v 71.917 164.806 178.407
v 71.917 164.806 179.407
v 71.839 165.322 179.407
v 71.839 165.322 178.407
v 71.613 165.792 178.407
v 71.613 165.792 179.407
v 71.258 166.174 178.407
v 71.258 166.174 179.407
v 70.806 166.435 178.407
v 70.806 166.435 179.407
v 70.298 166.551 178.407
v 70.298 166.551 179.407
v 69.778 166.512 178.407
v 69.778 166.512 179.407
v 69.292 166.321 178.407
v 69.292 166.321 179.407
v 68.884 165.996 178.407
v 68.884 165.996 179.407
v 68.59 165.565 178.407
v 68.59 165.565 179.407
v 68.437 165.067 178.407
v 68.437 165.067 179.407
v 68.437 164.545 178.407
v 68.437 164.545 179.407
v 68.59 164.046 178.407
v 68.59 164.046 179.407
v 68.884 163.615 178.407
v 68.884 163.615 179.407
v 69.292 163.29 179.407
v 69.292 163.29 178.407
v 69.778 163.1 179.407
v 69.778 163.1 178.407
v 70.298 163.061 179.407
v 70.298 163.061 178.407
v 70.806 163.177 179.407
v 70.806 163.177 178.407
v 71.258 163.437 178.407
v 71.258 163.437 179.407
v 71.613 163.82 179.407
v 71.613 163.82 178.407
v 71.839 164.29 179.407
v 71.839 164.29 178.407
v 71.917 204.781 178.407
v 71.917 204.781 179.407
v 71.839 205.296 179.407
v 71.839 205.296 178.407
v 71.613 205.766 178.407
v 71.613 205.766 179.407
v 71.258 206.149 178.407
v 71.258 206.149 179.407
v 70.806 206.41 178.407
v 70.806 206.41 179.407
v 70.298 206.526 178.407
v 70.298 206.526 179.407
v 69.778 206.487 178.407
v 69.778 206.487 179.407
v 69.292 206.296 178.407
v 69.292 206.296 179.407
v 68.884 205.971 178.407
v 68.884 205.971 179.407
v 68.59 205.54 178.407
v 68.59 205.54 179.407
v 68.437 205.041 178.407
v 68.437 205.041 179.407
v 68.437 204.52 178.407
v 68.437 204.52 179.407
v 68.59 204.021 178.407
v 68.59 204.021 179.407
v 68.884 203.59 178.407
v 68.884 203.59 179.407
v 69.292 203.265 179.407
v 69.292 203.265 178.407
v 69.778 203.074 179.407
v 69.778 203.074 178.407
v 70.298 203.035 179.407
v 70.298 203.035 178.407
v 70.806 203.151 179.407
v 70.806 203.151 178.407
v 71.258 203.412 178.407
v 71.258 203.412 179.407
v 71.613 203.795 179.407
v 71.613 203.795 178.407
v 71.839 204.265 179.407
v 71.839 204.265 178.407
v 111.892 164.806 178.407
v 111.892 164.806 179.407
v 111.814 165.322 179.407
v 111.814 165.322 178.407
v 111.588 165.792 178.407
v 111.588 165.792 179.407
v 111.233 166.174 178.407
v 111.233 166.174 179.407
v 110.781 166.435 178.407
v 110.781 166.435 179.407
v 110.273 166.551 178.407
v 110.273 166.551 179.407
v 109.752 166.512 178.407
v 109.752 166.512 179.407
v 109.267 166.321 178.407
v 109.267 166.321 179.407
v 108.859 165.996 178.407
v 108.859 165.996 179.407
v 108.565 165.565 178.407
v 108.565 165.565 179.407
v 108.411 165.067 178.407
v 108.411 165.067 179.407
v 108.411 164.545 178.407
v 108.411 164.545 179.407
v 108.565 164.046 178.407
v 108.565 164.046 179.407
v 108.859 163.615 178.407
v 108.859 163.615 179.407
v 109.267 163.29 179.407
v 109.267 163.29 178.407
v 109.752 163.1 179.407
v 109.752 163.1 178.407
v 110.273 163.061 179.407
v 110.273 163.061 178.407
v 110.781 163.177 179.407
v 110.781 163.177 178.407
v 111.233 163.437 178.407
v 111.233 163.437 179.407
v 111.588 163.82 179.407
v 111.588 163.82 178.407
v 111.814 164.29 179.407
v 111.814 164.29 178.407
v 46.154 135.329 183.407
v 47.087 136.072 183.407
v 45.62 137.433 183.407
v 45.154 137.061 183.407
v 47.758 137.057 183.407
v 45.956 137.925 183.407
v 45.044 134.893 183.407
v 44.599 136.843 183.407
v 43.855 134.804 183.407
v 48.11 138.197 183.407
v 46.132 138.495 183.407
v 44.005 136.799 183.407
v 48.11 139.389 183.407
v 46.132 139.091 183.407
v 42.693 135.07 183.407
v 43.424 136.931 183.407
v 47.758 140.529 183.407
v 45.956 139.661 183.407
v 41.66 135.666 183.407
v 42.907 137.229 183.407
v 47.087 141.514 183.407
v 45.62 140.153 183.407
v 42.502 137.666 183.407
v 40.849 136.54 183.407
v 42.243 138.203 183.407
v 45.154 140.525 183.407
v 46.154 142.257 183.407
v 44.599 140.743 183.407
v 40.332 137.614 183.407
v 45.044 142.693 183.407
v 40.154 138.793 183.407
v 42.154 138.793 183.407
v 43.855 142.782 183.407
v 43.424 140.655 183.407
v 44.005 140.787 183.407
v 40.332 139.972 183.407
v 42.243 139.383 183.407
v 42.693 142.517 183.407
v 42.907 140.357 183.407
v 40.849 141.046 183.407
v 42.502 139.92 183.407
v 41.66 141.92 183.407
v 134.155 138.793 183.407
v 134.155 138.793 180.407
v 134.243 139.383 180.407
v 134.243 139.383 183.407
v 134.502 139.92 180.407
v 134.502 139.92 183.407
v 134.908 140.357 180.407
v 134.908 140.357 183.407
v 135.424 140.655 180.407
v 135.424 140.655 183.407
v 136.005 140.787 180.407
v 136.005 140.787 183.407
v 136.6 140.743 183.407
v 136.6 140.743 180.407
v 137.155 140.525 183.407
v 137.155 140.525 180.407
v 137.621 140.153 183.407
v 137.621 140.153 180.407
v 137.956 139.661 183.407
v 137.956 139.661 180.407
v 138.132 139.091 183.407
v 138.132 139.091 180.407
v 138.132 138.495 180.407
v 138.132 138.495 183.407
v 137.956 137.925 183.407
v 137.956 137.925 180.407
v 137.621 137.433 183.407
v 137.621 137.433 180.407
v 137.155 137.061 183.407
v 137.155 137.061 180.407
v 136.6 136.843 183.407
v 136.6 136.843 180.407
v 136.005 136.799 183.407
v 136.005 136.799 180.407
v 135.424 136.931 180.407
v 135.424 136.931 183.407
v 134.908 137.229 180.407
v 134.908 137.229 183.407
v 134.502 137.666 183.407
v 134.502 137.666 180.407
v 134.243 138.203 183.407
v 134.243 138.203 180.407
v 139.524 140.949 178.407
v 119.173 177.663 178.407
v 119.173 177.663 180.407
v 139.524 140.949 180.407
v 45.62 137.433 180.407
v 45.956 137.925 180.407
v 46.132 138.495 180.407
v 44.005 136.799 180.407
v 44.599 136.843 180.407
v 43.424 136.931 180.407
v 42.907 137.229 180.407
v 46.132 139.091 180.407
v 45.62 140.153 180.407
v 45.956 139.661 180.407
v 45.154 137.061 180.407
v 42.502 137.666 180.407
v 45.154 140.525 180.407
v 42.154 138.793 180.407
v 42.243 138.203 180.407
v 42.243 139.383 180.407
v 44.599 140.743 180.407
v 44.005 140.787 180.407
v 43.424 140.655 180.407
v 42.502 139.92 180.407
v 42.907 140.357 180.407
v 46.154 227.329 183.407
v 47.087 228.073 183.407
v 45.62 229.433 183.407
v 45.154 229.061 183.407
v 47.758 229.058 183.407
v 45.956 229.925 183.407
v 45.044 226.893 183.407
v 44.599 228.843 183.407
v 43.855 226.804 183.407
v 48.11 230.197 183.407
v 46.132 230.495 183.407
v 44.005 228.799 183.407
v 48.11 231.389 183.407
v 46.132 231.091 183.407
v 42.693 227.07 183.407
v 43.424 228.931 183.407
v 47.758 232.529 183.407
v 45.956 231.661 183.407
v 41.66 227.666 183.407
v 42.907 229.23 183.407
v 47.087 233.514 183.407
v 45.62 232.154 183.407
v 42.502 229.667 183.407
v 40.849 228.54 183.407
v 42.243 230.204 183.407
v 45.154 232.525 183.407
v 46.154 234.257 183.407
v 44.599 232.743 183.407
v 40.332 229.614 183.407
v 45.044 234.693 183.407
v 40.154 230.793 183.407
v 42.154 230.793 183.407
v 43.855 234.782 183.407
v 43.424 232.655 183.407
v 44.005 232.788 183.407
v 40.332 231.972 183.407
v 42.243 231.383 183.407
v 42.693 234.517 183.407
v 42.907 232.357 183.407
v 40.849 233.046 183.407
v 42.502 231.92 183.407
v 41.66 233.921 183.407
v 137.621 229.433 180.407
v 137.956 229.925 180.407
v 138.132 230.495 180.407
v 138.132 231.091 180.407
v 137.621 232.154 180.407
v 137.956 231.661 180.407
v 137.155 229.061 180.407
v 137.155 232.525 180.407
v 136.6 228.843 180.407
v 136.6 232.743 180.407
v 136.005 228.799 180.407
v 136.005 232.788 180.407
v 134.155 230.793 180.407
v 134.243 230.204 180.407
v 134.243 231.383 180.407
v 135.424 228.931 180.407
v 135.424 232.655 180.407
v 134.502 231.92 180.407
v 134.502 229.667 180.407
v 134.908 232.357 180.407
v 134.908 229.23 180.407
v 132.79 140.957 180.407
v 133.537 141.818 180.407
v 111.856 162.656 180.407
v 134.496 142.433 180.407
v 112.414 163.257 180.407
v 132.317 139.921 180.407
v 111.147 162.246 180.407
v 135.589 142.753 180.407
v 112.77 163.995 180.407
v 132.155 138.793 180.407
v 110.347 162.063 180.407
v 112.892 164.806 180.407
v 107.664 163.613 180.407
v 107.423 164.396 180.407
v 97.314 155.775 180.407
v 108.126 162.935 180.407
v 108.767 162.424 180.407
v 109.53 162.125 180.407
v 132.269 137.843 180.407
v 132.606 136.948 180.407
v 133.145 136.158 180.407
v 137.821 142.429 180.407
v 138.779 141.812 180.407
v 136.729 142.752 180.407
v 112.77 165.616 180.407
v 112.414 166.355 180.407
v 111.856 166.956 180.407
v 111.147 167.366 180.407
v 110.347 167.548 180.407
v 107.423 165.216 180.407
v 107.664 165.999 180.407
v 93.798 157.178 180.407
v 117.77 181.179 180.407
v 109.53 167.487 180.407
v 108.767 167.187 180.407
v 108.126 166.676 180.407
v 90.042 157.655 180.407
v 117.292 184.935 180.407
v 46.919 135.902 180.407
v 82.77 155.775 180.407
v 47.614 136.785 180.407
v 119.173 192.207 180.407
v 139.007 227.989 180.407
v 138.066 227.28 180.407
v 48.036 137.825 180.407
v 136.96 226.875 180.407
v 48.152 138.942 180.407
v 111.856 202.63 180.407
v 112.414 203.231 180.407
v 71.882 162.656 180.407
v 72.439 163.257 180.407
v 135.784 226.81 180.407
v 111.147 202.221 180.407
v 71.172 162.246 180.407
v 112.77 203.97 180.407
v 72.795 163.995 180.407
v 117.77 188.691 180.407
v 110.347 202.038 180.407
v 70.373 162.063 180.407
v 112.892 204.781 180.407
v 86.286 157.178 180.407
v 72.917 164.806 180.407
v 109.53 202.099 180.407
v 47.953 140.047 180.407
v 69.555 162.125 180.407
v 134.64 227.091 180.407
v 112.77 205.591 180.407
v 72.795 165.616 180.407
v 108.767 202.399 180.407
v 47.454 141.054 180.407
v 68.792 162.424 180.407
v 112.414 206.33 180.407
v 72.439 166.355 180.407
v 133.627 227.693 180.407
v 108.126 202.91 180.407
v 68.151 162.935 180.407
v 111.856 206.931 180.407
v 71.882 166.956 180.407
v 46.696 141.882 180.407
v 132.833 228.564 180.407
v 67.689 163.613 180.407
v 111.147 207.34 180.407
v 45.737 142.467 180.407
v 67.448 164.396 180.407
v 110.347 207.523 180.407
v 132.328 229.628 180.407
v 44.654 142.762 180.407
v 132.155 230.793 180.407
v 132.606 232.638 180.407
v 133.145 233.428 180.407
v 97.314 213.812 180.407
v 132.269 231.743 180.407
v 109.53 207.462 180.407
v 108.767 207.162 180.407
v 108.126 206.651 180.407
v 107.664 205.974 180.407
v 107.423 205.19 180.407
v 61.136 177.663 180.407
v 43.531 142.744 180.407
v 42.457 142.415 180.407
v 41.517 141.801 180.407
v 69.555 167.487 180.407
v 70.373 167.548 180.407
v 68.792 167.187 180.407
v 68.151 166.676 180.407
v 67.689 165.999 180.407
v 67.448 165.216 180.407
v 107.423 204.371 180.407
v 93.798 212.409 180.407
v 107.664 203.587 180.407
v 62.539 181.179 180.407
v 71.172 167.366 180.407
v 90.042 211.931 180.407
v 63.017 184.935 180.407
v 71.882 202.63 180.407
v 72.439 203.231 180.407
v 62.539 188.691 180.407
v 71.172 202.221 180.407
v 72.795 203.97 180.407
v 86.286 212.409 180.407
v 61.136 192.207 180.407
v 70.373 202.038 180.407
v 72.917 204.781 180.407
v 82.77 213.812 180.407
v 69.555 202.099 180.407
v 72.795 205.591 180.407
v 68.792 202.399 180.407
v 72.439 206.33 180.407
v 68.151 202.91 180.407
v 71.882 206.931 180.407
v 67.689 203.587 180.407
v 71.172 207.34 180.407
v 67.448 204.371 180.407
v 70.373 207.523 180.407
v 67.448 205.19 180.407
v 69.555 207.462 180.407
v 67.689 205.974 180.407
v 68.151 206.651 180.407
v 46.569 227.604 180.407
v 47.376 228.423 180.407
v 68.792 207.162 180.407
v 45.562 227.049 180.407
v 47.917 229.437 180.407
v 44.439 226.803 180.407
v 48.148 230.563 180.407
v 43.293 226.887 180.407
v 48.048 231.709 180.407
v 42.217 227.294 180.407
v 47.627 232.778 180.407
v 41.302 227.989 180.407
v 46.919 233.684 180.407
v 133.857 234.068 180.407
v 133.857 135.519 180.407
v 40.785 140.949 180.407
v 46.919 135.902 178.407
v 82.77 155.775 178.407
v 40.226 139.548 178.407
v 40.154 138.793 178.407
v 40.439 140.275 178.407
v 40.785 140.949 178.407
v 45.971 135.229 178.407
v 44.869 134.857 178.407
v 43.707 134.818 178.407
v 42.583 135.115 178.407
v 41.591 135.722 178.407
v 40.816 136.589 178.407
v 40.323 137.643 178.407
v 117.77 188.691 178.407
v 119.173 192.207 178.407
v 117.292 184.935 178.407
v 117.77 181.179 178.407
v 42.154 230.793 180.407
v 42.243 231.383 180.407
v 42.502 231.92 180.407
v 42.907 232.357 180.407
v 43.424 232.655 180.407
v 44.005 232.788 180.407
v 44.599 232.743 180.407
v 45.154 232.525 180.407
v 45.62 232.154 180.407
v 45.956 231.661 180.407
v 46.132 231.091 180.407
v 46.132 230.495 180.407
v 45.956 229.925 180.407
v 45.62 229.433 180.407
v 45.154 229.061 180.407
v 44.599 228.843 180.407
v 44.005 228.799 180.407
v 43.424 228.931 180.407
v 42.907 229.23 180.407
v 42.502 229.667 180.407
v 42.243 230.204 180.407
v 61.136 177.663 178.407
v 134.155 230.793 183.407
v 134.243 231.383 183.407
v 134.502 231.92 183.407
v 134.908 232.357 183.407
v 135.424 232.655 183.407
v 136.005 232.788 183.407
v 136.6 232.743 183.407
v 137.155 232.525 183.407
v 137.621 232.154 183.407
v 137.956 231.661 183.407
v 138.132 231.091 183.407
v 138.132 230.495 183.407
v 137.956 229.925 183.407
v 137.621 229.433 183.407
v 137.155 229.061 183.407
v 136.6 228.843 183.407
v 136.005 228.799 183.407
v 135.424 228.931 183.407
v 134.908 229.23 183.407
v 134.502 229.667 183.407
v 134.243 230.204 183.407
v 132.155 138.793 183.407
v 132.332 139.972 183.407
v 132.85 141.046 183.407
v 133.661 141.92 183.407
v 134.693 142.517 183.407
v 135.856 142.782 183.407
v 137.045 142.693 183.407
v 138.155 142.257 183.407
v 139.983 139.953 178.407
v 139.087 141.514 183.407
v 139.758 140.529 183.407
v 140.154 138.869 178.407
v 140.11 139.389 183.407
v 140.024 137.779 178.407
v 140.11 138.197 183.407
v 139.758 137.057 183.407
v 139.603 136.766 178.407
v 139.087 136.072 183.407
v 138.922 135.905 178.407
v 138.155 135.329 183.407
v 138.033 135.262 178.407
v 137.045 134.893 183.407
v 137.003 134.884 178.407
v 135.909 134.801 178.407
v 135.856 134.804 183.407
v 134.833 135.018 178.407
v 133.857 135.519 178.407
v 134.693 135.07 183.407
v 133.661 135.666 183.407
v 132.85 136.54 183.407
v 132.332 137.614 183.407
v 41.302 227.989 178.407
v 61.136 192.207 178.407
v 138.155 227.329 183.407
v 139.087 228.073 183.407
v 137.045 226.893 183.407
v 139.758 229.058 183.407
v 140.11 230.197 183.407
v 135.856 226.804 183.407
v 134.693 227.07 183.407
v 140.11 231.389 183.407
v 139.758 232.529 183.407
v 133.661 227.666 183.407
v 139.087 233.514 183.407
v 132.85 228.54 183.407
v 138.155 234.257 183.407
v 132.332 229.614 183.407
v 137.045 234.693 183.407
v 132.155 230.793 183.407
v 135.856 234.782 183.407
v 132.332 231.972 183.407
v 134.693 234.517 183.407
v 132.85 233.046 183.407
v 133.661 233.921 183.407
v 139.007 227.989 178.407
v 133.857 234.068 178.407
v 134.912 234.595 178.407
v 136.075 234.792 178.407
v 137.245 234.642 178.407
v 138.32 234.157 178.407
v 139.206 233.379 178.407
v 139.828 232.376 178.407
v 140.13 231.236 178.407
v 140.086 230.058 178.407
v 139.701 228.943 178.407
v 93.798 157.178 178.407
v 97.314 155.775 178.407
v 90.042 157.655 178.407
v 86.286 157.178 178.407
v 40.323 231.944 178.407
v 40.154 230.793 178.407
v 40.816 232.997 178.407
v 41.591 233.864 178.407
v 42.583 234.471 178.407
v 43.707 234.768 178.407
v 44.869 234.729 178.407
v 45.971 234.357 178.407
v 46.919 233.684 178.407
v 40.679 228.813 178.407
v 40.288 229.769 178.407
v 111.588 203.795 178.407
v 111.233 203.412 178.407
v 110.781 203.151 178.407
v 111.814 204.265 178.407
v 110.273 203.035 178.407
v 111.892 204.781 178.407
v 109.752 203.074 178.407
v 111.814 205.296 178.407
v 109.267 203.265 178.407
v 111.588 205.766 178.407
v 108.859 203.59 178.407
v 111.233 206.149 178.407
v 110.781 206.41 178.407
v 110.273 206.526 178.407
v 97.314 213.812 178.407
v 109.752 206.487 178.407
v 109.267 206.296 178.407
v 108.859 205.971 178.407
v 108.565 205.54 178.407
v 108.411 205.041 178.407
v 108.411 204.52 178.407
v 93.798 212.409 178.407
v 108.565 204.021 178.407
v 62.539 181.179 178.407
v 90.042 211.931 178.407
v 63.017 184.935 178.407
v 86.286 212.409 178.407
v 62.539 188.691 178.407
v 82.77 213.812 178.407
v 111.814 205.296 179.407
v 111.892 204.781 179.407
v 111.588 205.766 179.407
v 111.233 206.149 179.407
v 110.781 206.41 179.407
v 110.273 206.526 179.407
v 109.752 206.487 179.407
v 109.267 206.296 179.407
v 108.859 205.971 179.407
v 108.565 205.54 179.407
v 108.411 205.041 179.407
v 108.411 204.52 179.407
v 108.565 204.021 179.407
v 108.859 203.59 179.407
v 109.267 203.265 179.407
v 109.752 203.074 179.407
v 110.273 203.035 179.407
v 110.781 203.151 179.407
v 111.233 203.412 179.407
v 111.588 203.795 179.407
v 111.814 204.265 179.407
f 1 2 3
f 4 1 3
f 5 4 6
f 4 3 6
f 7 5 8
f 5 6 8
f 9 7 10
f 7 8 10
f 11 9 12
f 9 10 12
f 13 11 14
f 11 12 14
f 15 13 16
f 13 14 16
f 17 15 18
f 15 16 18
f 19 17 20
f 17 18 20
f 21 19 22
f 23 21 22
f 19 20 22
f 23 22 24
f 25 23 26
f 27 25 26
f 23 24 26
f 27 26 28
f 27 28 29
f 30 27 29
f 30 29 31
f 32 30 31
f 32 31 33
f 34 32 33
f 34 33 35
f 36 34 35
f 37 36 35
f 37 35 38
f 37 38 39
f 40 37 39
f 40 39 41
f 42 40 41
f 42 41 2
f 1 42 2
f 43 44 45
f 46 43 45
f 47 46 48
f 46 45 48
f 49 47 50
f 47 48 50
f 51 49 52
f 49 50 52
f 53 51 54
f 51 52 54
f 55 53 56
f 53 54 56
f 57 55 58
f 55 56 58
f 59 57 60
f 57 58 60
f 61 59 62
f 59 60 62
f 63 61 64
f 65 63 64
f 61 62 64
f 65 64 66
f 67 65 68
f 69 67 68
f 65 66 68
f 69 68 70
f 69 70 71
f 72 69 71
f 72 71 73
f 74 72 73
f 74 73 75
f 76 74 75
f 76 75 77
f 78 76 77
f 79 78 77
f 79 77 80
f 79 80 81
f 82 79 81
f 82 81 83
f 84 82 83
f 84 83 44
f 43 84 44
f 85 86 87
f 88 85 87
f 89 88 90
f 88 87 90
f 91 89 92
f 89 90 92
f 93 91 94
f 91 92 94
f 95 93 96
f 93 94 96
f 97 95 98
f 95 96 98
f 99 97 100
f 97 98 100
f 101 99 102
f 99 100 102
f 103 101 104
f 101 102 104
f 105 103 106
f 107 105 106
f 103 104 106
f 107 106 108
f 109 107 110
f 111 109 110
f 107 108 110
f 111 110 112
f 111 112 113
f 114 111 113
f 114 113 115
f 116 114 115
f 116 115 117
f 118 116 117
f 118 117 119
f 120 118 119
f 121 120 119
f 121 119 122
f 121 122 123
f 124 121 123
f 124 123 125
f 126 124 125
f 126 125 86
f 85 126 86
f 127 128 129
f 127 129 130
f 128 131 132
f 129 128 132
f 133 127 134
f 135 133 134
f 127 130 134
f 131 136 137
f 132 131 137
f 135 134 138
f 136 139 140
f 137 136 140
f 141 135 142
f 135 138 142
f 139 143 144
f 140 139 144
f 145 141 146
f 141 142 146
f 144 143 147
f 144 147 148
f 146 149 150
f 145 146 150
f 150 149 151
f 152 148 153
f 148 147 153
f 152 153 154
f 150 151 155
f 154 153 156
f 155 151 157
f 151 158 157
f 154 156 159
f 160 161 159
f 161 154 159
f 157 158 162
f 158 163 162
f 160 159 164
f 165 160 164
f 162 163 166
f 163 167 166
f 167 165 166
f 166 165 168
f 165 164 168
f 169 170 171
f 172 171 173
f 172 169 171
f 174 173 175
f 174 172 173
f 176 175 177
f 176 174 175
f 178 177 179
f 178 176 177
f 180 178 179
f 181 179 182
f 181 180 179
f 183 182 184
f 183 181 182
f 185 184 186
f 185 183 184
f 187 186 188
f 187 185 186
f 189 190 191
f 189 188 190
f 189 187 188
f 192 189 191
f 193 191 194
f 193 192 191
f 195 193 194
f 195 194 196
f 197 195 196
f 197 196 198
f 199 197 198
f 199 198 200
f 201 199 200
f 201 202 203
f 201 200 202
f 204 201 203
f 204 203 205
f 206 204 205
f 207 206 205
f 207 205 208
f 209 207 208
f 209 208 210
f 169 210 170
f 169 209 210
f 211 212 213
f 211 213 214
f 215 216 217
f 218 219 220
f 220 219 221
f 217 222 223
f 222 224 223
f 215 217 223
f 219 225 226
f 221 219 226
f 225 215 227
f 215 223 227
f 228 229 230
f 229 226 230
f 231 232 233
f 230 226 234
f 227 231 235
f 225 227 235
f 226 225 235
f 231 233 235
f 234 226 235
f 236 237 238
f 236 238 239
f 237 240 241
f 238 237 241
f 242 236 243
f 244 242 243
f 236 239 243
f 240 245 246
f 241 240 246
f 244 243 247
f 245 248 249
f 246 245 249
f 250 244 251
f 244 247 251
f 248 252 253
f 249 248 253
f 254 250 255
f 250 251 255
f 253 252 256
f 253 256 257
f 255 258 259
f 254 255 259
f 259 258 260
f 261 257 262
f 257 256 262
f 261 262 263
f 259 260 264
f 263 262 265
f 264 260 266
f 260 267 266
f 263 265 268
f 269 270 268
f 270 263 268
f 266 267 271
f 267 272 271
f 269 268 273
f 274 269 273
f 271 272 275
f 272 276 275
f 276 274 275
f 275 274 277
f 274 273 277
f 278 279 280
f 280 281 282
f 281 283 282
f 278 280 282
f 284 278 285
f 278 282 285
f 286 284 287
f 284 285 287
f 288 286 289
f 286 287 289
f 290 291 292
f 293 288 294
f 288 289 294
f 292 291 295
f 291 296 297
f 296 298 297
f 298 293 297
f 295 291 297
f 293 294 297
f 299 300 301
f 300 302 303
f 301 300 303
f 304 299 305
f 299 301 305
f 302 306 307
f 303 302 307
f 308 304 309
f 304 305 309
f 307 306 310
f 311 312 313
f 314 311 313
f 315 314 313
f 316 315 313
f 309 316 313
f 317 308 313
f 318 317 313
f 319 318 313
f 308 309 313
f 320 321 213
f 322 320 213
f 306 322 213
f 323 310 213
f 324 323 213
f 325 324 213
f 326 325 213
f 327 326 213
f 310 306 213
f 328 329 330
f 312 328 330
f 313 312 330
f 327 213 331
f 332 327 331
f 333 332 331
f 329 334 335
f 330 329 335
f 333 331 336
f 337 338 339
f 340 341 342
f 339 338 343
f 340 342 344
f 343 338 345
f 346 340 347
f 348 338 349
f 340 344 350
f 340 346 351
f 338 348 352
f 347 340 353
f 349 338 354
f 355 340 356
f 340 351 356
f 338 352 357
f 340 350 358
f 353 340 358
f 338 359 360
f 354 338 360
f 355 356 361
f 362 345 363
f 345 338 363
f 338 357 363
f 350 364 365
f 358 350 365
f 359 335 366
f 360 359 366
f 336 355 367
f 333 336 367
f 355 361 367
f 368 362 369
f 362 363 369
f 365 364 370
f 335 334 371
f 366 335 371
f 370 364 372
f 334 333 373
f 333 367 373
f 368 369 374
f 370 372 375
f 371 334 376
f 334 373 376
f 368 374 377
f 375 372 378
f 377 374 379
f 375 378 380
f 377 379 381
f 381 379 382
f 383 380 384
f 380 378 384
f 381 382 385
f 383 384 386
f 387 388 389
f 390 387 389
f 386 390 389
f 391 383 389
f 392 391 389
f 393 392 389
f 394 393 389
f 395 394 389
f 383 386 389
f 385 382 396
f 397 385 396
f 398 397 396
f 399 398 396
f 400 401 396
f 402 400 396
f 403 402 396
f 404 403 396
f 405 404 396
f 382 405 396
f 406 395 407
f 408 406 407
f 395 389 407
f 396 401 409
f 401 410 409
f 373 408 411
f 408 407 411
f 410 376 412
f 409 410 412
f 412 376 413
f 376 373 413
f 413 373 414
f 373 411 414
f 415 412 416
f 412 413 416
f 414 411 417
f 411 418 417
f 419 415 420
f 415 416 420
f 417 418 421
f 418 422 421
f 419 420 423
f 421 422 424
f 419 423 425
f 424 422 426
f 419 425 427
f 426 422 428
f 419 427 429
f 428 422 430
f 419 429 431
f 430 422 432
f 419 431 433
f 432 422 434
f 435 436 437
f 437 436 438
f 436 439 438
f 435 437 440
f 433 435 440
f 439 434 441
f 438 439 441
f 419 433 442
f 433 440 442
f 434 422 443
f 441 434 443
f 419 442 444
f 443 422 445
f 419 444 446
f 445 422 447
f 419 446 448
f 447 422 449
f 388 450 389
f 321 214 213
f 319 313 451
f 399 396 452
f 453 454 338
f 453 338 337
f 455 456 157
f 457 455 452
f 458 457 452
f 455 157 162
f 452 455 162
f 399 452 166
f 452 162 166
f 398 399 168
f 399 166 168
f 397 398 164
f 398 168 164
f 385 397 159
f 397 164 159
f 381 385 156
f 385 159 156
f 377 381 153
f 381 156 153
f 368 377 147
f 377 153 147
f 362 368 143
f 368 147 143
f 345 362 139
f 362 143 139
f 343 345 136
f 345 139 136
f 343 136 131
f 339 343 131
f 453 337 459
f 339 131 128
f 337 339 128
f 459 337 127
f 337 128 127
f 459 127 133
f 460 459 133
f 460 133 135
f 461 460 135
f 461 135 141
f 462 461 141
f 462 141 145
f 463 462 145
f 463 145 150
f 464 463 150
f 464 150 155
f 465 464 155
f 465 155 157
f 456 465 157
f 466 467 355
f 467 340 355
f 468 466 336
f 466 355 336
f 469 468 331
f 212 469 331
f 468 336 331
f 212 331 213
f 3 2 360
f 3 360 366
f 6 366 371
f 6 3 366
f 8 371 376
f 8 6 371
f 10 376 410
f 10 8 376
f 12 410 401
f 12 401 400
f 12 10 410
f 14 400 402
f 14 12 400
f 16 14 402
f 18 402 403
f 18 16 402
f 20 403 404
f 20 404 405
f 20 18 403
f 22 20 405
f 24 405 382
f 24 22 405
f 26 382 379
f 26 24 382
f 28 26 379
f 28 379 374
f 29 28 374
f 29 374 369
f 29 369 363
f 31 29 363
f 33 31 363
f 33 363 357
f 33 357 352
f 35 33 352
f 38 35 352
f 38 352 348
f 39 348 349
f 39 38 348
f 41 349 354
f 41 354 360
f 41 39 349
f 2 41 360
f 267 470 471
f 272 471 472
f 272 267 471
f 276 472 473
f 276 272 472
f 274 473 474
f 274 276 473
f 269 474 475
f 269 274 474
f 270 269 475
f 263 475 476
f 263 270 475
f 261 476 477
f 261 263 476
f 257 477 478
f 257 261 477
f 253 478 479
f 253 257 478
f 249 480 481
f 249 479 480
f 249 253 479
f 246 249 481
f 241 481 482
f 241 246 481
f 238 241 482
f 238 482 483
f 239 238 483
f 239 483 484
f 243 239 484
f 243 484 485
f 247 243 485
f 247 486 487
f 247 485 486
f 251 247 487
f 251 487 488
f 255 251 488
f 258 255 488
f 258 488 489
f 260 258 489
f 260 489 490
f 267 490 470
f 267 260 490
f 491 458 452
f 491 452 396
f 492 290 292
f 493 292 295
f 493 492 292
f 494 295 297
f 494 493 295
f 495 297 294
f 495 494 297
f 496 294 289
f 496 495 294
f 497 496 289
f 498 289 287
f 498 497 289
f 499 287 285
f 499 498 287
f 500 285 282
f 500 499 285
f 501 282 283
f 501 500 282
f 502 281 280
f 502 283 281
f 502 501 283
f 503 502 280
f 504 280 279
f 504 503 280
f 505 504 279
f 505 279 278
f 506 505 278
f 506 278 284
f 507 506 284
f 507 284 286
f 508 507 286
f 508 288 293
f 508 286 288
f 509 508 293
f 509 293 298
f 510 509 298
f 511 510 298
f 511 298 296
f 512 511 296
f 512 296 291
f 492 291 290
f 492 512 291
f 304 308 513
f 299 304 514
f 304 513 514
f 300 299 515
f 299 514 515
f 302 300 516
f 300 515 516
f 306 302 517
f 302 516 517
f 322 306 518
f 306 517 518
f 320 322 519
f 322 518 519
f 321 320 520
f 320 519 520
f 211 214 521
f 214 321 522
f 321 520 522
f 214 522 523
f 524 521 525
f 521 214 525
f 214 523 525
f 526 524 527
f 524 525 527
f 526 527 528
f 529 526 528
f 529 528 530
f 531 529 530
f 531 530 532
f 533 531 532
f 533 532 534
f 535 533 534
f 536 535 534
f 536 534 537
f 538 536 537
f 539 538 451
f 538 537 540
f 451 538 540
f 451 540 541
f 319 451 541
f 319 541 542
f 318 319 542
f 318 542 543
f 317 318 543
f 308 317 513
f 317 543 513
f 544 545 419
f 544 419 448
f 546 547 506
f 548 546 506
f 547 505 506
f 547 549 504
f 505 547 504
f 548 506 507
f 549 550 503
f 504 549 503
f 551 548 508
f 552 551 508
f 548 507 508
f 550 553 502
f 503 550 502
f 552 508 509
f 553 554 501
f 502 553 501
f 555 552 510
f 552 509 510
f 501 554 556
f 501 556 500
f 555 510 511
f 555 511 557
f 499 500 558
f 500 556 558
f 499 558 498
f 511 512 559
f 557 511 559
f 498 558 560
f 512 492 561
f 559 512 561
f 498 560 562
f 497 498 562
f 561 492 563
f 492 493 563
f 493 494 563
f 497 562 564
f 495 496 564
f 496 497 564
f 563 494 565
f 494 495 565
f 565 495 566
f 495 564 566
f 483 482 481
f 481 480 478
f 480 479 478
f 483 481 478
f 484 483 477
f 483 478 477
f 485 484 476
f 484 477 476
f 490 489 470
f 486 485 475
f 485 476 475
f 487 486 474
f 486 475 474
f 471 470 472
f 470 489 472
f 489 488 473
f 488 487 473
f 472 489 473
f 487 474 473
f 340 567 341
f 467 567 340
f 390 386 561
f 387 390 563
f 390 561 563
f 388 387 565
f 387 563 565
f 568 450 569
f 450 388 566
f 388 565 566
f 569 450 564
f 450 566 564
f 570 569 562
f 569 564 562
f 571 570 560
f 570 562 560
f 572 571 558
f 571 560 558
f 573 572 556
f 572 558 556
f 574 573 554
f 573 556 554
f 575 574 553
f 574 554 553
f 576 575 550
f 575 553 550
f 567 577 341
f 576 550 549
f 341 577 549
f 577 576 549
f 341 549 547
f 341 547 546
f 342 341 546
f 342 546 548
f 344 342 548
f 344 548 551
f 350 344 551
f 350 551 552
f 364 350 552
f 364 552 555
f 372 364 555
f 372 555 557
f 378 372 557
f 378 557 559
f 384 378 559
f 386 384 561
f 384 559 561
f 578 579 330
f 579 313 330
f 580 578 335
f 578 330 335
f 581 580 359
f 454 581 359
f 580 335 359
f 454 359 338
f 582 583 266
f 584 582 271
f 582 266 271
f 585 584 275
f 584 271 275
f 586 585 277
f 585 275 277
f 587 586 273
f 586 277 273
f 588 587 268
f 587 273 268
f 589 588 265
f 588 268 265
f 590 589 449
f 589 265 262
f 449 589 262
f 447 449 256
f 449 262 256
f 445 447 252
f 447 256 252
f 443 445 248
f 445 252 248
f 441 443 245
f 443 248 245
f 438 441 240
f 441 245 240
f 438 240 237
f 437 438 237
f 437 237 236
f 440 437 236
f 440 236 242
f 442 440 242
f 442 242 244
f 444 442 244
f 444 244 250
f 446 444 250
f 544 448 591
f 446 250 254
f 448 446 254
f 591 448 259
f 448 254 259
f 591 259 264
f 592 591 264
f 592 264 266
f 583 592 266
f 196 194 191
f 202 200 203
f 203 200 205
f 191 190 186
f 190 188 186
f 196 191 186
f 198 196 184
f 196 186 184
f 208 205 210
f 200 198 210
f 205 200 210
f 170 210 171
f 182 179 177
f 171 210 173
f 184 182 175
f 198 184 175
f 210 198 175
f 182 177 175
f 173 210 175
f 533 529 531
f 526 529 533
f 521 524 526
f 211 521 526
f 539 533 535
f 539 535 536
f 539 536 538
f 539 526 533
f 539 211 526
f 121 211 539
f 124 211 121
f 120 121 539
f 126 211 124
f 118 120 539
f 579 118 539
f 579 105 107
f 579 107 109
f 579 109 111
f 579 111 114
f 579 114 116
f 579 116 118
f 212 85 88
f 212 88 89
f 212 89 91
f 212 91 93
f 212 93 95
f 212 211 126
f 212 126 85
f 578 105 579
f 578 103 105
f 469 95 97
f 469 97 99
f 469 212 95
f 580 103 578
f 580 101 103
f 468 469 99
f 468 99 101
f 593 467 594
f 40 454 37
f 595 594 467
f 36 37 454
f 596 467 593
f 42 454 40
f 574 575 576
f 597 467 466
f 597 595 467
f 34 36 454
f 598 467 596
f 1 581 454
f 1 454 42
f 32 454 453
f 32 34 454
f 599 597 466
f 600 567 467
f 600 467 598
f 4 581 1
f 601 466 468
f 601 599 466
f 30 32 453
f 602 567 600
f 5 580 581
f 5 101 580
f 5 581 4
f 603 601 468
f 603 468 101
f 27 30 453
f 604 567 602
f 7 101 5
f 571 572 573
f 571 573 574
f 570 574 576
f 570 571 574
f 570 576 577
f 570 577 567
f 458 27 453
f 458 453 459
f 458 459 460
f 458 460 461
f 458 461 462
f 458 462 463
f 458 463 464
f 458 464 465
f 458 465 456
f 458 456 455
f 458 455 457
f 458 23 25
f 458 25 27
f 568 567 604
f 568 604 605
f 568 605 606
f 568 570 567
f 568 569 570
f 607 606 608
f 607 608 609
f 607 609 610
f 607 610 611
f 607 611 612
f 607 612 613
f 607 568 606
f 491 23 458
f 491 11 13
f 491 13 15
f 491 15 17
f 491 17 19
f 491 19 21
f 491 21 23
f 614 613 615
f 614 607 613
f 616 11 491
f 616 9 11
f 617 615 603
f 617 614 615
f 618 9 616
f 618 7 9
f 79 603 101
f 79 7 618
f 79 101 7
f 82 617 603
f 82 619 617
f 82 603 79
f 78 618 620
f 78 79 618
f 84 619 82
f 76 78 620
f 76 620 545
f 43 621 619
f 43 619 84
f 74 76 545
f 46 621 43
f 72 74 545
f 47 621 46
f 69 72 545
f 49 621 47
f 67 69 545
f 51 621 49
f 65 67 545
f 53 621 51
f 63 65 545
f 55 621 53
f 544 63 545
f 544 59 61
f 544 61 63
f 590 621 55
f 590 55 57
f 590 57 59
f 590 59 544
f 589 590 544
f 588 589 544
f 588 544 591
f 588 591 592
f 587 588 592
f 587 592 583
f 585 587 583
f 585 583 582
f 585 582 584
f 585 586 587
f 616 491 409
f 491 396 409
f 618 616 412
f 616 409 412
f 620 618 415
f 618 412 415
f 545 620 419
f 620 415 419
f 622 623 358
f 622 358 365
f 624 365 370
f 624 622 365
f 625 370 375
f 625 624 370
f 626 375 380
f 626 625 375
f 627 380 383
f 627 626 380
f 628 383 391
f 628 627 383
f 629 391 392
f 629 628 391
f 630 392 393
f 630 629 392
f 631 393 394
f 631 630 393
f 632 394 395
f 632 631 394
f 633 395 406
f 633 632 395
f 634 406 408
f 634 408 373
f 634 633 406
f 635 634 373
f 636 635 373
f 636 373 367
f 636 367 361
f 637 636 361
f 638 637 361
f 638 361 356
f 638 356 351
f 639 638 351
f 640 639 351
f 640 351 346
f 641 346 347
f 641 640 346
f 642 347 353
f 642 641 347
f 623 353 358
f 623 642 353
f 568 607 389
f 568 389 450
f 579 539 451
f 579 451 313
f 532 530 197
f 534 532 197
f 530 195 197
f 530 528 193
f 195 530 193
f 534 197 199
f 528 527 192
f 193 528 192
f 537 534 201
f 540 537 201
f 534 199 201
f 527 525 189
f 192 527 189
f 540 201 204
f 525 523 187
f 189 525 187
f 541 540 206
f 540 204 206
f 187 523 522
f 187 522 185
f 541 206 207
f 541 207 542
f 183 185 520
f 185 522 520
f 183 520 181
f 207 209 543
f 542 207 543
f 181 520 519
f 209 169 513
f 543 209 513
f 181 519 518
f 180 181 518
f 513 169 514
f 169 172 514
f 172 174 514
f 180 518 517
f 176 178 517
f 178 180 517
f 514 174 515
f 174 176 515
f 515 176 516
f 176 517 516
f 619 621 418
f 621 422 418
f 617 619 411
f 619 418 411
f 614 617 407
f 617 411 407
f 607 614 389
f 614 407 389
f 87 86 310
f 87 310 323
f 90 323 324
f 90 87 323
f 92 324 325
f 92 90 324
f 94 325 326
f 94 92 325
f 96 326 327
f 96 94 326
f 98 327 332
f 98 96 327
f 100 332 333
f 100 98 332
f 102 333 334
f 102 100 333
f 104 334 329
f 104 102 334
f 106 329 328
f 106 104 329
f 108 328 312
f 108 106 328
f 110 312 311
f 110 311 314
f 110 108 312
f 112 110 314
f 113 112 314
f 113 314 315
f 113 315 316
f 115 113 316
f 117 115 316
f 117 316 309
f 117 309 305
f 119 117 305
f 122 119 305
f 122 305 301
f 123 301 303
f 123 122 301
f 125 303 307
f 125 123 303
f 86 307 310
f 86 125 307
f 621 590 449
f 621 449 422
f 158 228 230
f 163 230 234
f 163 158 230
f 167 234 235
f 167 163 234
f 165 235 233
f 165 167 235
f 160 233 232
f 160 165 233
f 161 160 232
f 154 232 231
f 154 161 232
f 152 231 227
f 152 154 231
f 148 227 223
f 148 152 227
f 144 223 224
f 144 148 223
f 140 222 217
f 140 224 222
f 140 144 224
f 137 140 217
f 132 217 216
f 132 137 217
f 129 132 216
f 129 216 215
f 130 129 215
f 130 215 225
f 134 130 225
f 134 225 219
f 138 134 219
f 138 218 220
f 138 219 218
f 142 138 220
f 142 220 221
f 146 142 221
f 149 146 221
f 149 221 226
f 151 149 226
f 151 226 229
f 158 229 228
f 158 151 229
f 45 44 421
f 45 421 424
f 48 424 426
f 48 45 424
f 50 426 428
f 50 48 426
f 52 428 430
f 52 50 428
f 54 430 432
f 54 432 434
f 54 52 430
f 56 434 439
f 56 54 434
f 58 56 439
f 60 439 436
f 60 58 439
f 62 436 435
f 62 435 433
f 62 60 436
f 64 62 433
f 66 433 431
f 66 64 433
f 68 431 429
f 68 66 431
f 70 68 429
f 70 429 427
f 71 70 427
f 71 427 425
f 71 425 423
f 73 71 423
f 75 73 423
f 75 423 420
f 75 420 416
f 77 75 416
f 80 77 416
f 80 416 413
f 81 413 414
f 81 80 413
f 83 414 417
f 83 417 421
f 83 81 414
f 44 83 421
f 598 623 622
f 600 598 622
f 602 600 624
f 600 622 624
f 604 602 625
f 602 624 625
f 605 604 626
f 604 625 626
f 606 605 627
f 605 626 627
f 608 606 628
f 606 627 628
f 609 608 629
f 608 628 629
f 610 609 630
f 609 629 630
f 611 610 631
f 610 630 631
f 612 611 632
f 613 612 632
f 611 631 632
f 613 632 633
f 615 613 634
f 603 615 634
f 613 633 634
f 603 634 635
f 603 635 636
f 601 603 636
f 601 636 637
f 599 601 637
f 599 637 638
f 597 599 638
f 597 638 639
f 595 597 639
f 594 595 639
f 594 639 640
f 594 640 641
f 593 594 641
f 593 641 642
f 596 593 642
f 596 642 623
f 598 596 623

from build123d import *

# Parameters (mm, degrees)
SKETCH2_R             = 4
SKETCH2_R_2           = 2.00000381
BOSS_EXTRUDE1_DEPTH   = 5
BOSS_EXTRUDE1_2_DEPTH = 5
BOSS_EXTRUDE1_3_DEPTH = 5
BOSS_EXTRUDE1_4_DEPTH = 5
BOSS_EXTRUDE2_DEPTH   = 2
FILLET1_R             = 15
CUT_EXTRUDE1_REACH    = 4
SKETCH4_R             = 1.75
CHAMFER1_SIZE         = 1


with BuildPart() as part:
    # Sketch2 → Boss-Extrude1 (new body)
    with BuildSketch(Plane(origin=(0, 0, 183.407141652), x_dir=(-1, 0, 0), z_dir=(0, 0, -1))):
        with Locations((-136.154543014, 230.793193515)):
            Circle(SKETCH2_R)
        with Locations((-136.154543014, 230.793193515)):
            Circle(SKETCH2_R_2, mode=Mode.SUBTRACT)
    extrude(amount=BOSS_EXTRUDE1_DEPTH)



with BuildPart() as body_2:
    # Sketch2 → Boss-Extrude1 2 (new body)
    with BuildSketch(Plane(origin=(0, 0, 183.407141652), x_dir=(-1, 0, 0), z_dir=(0, 0, -1))):
        with Locations((-44.154357594, 230.793193515)):
            Circle(SKETCH2_R)
        with Locations((-44.154357594, 230.793193515)):
            Circle(SKETCH2_R_2, mode=Mode.SUBTRACT)
    extrude(amount=BOSS_EXTRUDE1_2_DEPTH)


with BuildPart() as body_3:
    # Sketch2 → Boss-Extrude1 3 (new body)
    with BuildSketch(Plane(origin=(0, 0, 183.407141652), x_dir=(-1, 0, 0), z_dir=(0, 0, -1))):
        with Locations((-44.154357594, 138.793008095)):
            Circle(SKETCH2_R)
        with Locations((-44.154357594, 138.793008095)):
            Circle(SKETCH2_R_2, mode=Mode.SUBTRACT)
    extrude(amount=BOSS_EXTRUDE1_3_DEPTH)


with BuildPart() as body_4:
    # Sketch2 → Boss-Extrude1 4 (new body)
    with BuildSketch(Plane(origin=(0, 0, 183.407141652), x_dir=(-1, 0, 0), z_dir=(0, 0, -1))):
        with Locations((-136.154543014, 138.793008095)):
            Circle(SKETCH2_R)
        with Locations((-136.154543014, 138.793008095)):
            Circle(SKETCH2_R_2, mode=Mode.SUBTRACT)
    extrude(amount=BOSS_EXTRUDE1_4_DEPTH)


with BuildPart() as part_1:
    add(part.part)

    add(body_2.part)  # Boss-Extrude2 merges body 2

    add(body_3.part)  # Boss-Extrude2 merges body 3

    add(body_4.part)  # Boss-Extrude2 merges body 4
    # Sketch3 → Boss-Extrude2 (add)
    with BuildSketch(Plane(origin=(0, 0, 178.407141652), x_dir=(-1, 0, 0), z_dir=(0, 0, -1))):
        with BuildLine():
            Line((-139.007032023, 227.989034737), (-115.141850609, 184.935107777))
            Line((-115.141850609, 184.935107777), (-139.523599689, 140.949268079))
            ThreePointArc((-139.523599689, 140.949268079), (-138.922212365, 135.905101177), (-133.857043766, 135.518638354))
            Line((-133.857043766, 135.518638354), (-90.042023818, 159.8057005))
            Line((-90.042023818, 159.8057005), (-46.919036743, 135.902238439))
            ThreePointArc((-46.919036743, 135.902238439), (-41.612813753, 135.704229226), (-40.785300919, 140.949268079))
            Line((-40.785300919, 140.949268079), (-65.167049999, 184.935107777))
            Line((-65.167049999, 184.935107777), (-41.301868585, 227.989034737))
            ThreePointArc((-41.301868585, 227.989034737), (-41.306554913, 233.602111436), (-46.919036743, 233.683963171))
            Line((-46.919036743, 233.683963171), (-90.042023818, 209.78050111))
            Line((-90.042023818, 209.78050111), (-133.857043766, 234.067563256))
            ThreePointArc((-133.857043766, 234.067563256), (-139.206449083, 233.378898322), (-139.007032023, 227.989034737))
        make_face()
    extrude(amount=-BOSS_EXTRUDE2_DEPTH)

    # Fillet1
    fillet1_edges = [part_1.edges().sort_by_distance(p)[0] for p in [
        (90.042023818, 209.78050111, 179.407141652),
        (65.167049999, 184.935107777, 179.407141652),
        (90.042023818, 159.8057005, 179.407141652),
        (115.141850609, 184.935107777, 179.407141652),
    ]]
    fillet(fillet1_edges, radius=FILLET1_R)

    # Sketch4 → Cut-Extrude1 (cut, up to next)
    with BuildSketch(Plane.XY.offset(180.407141652), mode=Mode.PRIVATE) as cut_extrude1_sk1:
        with Locations((70.167049999, 204.78050111)):
            Circle(SKETCH4_R)
    cut_extrude1_tool1 = extrude(cut_extrude1_sk1.sketch, amount=-CUT_EXTRUDE1_REACH, mode=Mode.PRIVATE) & part_1.part
    add(cut_extrude1_tool1.solids().sort_by_distance((70.16705, 204.780501, 180.407142))[0], mode=Mode.SUBTRACT)
    # Sketch4 → Cut-Extrude1 (cut, up to next)
    with BuildSketch(Plane.XY.offset(180.407141652), mode=Mode.PRIVATE) as cut_extrude1_sk2:
        with Locations((110.141850609, 204.78050111)):
            Circle(SKETCH4_R)
    cut_extrude1_tool2 = extrude(cut_extrude1_sk2.sketch, amount=-CUT_EXTRUDE1_REACH, mode=Mode.PRIVATE) & part_1.part
    add(cut_extrude1_tool2.solids().sort_by_distance((110.141851, 204.780501, 180.407142))[0], mode=Mode.SUBTRACT)
    # Sketch4 → Cut-Extrude1 (cut, up to next)
    with BuildSketch(Plane.XY.offset(180.407141652), mode=Mode.PRIVATE) as cut_extrude1_sk3:
        with Locations((110.141850609, 164.8057005)):
            Circle(SKETCH4_R)
    cut_extrude1_tool3 = extrude(cut_extrude1_sk3.sketch, amount=-CUT_EXTRUDE1_REACH, mode=Mode.PRIVATE) & part_1.part
    add(cut_extrude1_tool3.solids().sort_by_distance((110.141851, 164.805701, 180.407142))[0], mode=Mode.SUBTRACT)
    # Sketch4 → Cut-Extrude1 (cut, up to next)
    with BuildSketch(Plane.XY.offset(180.407141652), mode=Mode.PRIVATE) as cut_extrude1_sk4:
        with Locations((70.167049999, 164.8057005)):
            Circle(SKETCH4_R)
    cut_extrude1_tool4 = extrude(cut_extrude1_sk4.sketch, amount=-CUT_EXTRUDE1_REACH, mode=Mode.PRIVATE) & part_1.part
    add(cut_extrude1_tool4.solids().sort_by_distance((70.16705, 164.805701, 180.407142))[0], mode=Mode.SUBTRACT)

    # Chamfer1
    chamfer1_edges = [part_1.edges().sort_by_distance(p)[0] for p in [
        (68.417049999, 164.8057005, 180.407141652),
        (108.391850609, 164.8057005, 180.407141652),
        (108.391850609, 204.78050111, 180.407141652),
        (68.417049999, 204.78050111, 180.407141652),
    ]]
    chamfer(chamfer1_edges, length=CHAMFER1_SIZE)


solid = part_1.part
